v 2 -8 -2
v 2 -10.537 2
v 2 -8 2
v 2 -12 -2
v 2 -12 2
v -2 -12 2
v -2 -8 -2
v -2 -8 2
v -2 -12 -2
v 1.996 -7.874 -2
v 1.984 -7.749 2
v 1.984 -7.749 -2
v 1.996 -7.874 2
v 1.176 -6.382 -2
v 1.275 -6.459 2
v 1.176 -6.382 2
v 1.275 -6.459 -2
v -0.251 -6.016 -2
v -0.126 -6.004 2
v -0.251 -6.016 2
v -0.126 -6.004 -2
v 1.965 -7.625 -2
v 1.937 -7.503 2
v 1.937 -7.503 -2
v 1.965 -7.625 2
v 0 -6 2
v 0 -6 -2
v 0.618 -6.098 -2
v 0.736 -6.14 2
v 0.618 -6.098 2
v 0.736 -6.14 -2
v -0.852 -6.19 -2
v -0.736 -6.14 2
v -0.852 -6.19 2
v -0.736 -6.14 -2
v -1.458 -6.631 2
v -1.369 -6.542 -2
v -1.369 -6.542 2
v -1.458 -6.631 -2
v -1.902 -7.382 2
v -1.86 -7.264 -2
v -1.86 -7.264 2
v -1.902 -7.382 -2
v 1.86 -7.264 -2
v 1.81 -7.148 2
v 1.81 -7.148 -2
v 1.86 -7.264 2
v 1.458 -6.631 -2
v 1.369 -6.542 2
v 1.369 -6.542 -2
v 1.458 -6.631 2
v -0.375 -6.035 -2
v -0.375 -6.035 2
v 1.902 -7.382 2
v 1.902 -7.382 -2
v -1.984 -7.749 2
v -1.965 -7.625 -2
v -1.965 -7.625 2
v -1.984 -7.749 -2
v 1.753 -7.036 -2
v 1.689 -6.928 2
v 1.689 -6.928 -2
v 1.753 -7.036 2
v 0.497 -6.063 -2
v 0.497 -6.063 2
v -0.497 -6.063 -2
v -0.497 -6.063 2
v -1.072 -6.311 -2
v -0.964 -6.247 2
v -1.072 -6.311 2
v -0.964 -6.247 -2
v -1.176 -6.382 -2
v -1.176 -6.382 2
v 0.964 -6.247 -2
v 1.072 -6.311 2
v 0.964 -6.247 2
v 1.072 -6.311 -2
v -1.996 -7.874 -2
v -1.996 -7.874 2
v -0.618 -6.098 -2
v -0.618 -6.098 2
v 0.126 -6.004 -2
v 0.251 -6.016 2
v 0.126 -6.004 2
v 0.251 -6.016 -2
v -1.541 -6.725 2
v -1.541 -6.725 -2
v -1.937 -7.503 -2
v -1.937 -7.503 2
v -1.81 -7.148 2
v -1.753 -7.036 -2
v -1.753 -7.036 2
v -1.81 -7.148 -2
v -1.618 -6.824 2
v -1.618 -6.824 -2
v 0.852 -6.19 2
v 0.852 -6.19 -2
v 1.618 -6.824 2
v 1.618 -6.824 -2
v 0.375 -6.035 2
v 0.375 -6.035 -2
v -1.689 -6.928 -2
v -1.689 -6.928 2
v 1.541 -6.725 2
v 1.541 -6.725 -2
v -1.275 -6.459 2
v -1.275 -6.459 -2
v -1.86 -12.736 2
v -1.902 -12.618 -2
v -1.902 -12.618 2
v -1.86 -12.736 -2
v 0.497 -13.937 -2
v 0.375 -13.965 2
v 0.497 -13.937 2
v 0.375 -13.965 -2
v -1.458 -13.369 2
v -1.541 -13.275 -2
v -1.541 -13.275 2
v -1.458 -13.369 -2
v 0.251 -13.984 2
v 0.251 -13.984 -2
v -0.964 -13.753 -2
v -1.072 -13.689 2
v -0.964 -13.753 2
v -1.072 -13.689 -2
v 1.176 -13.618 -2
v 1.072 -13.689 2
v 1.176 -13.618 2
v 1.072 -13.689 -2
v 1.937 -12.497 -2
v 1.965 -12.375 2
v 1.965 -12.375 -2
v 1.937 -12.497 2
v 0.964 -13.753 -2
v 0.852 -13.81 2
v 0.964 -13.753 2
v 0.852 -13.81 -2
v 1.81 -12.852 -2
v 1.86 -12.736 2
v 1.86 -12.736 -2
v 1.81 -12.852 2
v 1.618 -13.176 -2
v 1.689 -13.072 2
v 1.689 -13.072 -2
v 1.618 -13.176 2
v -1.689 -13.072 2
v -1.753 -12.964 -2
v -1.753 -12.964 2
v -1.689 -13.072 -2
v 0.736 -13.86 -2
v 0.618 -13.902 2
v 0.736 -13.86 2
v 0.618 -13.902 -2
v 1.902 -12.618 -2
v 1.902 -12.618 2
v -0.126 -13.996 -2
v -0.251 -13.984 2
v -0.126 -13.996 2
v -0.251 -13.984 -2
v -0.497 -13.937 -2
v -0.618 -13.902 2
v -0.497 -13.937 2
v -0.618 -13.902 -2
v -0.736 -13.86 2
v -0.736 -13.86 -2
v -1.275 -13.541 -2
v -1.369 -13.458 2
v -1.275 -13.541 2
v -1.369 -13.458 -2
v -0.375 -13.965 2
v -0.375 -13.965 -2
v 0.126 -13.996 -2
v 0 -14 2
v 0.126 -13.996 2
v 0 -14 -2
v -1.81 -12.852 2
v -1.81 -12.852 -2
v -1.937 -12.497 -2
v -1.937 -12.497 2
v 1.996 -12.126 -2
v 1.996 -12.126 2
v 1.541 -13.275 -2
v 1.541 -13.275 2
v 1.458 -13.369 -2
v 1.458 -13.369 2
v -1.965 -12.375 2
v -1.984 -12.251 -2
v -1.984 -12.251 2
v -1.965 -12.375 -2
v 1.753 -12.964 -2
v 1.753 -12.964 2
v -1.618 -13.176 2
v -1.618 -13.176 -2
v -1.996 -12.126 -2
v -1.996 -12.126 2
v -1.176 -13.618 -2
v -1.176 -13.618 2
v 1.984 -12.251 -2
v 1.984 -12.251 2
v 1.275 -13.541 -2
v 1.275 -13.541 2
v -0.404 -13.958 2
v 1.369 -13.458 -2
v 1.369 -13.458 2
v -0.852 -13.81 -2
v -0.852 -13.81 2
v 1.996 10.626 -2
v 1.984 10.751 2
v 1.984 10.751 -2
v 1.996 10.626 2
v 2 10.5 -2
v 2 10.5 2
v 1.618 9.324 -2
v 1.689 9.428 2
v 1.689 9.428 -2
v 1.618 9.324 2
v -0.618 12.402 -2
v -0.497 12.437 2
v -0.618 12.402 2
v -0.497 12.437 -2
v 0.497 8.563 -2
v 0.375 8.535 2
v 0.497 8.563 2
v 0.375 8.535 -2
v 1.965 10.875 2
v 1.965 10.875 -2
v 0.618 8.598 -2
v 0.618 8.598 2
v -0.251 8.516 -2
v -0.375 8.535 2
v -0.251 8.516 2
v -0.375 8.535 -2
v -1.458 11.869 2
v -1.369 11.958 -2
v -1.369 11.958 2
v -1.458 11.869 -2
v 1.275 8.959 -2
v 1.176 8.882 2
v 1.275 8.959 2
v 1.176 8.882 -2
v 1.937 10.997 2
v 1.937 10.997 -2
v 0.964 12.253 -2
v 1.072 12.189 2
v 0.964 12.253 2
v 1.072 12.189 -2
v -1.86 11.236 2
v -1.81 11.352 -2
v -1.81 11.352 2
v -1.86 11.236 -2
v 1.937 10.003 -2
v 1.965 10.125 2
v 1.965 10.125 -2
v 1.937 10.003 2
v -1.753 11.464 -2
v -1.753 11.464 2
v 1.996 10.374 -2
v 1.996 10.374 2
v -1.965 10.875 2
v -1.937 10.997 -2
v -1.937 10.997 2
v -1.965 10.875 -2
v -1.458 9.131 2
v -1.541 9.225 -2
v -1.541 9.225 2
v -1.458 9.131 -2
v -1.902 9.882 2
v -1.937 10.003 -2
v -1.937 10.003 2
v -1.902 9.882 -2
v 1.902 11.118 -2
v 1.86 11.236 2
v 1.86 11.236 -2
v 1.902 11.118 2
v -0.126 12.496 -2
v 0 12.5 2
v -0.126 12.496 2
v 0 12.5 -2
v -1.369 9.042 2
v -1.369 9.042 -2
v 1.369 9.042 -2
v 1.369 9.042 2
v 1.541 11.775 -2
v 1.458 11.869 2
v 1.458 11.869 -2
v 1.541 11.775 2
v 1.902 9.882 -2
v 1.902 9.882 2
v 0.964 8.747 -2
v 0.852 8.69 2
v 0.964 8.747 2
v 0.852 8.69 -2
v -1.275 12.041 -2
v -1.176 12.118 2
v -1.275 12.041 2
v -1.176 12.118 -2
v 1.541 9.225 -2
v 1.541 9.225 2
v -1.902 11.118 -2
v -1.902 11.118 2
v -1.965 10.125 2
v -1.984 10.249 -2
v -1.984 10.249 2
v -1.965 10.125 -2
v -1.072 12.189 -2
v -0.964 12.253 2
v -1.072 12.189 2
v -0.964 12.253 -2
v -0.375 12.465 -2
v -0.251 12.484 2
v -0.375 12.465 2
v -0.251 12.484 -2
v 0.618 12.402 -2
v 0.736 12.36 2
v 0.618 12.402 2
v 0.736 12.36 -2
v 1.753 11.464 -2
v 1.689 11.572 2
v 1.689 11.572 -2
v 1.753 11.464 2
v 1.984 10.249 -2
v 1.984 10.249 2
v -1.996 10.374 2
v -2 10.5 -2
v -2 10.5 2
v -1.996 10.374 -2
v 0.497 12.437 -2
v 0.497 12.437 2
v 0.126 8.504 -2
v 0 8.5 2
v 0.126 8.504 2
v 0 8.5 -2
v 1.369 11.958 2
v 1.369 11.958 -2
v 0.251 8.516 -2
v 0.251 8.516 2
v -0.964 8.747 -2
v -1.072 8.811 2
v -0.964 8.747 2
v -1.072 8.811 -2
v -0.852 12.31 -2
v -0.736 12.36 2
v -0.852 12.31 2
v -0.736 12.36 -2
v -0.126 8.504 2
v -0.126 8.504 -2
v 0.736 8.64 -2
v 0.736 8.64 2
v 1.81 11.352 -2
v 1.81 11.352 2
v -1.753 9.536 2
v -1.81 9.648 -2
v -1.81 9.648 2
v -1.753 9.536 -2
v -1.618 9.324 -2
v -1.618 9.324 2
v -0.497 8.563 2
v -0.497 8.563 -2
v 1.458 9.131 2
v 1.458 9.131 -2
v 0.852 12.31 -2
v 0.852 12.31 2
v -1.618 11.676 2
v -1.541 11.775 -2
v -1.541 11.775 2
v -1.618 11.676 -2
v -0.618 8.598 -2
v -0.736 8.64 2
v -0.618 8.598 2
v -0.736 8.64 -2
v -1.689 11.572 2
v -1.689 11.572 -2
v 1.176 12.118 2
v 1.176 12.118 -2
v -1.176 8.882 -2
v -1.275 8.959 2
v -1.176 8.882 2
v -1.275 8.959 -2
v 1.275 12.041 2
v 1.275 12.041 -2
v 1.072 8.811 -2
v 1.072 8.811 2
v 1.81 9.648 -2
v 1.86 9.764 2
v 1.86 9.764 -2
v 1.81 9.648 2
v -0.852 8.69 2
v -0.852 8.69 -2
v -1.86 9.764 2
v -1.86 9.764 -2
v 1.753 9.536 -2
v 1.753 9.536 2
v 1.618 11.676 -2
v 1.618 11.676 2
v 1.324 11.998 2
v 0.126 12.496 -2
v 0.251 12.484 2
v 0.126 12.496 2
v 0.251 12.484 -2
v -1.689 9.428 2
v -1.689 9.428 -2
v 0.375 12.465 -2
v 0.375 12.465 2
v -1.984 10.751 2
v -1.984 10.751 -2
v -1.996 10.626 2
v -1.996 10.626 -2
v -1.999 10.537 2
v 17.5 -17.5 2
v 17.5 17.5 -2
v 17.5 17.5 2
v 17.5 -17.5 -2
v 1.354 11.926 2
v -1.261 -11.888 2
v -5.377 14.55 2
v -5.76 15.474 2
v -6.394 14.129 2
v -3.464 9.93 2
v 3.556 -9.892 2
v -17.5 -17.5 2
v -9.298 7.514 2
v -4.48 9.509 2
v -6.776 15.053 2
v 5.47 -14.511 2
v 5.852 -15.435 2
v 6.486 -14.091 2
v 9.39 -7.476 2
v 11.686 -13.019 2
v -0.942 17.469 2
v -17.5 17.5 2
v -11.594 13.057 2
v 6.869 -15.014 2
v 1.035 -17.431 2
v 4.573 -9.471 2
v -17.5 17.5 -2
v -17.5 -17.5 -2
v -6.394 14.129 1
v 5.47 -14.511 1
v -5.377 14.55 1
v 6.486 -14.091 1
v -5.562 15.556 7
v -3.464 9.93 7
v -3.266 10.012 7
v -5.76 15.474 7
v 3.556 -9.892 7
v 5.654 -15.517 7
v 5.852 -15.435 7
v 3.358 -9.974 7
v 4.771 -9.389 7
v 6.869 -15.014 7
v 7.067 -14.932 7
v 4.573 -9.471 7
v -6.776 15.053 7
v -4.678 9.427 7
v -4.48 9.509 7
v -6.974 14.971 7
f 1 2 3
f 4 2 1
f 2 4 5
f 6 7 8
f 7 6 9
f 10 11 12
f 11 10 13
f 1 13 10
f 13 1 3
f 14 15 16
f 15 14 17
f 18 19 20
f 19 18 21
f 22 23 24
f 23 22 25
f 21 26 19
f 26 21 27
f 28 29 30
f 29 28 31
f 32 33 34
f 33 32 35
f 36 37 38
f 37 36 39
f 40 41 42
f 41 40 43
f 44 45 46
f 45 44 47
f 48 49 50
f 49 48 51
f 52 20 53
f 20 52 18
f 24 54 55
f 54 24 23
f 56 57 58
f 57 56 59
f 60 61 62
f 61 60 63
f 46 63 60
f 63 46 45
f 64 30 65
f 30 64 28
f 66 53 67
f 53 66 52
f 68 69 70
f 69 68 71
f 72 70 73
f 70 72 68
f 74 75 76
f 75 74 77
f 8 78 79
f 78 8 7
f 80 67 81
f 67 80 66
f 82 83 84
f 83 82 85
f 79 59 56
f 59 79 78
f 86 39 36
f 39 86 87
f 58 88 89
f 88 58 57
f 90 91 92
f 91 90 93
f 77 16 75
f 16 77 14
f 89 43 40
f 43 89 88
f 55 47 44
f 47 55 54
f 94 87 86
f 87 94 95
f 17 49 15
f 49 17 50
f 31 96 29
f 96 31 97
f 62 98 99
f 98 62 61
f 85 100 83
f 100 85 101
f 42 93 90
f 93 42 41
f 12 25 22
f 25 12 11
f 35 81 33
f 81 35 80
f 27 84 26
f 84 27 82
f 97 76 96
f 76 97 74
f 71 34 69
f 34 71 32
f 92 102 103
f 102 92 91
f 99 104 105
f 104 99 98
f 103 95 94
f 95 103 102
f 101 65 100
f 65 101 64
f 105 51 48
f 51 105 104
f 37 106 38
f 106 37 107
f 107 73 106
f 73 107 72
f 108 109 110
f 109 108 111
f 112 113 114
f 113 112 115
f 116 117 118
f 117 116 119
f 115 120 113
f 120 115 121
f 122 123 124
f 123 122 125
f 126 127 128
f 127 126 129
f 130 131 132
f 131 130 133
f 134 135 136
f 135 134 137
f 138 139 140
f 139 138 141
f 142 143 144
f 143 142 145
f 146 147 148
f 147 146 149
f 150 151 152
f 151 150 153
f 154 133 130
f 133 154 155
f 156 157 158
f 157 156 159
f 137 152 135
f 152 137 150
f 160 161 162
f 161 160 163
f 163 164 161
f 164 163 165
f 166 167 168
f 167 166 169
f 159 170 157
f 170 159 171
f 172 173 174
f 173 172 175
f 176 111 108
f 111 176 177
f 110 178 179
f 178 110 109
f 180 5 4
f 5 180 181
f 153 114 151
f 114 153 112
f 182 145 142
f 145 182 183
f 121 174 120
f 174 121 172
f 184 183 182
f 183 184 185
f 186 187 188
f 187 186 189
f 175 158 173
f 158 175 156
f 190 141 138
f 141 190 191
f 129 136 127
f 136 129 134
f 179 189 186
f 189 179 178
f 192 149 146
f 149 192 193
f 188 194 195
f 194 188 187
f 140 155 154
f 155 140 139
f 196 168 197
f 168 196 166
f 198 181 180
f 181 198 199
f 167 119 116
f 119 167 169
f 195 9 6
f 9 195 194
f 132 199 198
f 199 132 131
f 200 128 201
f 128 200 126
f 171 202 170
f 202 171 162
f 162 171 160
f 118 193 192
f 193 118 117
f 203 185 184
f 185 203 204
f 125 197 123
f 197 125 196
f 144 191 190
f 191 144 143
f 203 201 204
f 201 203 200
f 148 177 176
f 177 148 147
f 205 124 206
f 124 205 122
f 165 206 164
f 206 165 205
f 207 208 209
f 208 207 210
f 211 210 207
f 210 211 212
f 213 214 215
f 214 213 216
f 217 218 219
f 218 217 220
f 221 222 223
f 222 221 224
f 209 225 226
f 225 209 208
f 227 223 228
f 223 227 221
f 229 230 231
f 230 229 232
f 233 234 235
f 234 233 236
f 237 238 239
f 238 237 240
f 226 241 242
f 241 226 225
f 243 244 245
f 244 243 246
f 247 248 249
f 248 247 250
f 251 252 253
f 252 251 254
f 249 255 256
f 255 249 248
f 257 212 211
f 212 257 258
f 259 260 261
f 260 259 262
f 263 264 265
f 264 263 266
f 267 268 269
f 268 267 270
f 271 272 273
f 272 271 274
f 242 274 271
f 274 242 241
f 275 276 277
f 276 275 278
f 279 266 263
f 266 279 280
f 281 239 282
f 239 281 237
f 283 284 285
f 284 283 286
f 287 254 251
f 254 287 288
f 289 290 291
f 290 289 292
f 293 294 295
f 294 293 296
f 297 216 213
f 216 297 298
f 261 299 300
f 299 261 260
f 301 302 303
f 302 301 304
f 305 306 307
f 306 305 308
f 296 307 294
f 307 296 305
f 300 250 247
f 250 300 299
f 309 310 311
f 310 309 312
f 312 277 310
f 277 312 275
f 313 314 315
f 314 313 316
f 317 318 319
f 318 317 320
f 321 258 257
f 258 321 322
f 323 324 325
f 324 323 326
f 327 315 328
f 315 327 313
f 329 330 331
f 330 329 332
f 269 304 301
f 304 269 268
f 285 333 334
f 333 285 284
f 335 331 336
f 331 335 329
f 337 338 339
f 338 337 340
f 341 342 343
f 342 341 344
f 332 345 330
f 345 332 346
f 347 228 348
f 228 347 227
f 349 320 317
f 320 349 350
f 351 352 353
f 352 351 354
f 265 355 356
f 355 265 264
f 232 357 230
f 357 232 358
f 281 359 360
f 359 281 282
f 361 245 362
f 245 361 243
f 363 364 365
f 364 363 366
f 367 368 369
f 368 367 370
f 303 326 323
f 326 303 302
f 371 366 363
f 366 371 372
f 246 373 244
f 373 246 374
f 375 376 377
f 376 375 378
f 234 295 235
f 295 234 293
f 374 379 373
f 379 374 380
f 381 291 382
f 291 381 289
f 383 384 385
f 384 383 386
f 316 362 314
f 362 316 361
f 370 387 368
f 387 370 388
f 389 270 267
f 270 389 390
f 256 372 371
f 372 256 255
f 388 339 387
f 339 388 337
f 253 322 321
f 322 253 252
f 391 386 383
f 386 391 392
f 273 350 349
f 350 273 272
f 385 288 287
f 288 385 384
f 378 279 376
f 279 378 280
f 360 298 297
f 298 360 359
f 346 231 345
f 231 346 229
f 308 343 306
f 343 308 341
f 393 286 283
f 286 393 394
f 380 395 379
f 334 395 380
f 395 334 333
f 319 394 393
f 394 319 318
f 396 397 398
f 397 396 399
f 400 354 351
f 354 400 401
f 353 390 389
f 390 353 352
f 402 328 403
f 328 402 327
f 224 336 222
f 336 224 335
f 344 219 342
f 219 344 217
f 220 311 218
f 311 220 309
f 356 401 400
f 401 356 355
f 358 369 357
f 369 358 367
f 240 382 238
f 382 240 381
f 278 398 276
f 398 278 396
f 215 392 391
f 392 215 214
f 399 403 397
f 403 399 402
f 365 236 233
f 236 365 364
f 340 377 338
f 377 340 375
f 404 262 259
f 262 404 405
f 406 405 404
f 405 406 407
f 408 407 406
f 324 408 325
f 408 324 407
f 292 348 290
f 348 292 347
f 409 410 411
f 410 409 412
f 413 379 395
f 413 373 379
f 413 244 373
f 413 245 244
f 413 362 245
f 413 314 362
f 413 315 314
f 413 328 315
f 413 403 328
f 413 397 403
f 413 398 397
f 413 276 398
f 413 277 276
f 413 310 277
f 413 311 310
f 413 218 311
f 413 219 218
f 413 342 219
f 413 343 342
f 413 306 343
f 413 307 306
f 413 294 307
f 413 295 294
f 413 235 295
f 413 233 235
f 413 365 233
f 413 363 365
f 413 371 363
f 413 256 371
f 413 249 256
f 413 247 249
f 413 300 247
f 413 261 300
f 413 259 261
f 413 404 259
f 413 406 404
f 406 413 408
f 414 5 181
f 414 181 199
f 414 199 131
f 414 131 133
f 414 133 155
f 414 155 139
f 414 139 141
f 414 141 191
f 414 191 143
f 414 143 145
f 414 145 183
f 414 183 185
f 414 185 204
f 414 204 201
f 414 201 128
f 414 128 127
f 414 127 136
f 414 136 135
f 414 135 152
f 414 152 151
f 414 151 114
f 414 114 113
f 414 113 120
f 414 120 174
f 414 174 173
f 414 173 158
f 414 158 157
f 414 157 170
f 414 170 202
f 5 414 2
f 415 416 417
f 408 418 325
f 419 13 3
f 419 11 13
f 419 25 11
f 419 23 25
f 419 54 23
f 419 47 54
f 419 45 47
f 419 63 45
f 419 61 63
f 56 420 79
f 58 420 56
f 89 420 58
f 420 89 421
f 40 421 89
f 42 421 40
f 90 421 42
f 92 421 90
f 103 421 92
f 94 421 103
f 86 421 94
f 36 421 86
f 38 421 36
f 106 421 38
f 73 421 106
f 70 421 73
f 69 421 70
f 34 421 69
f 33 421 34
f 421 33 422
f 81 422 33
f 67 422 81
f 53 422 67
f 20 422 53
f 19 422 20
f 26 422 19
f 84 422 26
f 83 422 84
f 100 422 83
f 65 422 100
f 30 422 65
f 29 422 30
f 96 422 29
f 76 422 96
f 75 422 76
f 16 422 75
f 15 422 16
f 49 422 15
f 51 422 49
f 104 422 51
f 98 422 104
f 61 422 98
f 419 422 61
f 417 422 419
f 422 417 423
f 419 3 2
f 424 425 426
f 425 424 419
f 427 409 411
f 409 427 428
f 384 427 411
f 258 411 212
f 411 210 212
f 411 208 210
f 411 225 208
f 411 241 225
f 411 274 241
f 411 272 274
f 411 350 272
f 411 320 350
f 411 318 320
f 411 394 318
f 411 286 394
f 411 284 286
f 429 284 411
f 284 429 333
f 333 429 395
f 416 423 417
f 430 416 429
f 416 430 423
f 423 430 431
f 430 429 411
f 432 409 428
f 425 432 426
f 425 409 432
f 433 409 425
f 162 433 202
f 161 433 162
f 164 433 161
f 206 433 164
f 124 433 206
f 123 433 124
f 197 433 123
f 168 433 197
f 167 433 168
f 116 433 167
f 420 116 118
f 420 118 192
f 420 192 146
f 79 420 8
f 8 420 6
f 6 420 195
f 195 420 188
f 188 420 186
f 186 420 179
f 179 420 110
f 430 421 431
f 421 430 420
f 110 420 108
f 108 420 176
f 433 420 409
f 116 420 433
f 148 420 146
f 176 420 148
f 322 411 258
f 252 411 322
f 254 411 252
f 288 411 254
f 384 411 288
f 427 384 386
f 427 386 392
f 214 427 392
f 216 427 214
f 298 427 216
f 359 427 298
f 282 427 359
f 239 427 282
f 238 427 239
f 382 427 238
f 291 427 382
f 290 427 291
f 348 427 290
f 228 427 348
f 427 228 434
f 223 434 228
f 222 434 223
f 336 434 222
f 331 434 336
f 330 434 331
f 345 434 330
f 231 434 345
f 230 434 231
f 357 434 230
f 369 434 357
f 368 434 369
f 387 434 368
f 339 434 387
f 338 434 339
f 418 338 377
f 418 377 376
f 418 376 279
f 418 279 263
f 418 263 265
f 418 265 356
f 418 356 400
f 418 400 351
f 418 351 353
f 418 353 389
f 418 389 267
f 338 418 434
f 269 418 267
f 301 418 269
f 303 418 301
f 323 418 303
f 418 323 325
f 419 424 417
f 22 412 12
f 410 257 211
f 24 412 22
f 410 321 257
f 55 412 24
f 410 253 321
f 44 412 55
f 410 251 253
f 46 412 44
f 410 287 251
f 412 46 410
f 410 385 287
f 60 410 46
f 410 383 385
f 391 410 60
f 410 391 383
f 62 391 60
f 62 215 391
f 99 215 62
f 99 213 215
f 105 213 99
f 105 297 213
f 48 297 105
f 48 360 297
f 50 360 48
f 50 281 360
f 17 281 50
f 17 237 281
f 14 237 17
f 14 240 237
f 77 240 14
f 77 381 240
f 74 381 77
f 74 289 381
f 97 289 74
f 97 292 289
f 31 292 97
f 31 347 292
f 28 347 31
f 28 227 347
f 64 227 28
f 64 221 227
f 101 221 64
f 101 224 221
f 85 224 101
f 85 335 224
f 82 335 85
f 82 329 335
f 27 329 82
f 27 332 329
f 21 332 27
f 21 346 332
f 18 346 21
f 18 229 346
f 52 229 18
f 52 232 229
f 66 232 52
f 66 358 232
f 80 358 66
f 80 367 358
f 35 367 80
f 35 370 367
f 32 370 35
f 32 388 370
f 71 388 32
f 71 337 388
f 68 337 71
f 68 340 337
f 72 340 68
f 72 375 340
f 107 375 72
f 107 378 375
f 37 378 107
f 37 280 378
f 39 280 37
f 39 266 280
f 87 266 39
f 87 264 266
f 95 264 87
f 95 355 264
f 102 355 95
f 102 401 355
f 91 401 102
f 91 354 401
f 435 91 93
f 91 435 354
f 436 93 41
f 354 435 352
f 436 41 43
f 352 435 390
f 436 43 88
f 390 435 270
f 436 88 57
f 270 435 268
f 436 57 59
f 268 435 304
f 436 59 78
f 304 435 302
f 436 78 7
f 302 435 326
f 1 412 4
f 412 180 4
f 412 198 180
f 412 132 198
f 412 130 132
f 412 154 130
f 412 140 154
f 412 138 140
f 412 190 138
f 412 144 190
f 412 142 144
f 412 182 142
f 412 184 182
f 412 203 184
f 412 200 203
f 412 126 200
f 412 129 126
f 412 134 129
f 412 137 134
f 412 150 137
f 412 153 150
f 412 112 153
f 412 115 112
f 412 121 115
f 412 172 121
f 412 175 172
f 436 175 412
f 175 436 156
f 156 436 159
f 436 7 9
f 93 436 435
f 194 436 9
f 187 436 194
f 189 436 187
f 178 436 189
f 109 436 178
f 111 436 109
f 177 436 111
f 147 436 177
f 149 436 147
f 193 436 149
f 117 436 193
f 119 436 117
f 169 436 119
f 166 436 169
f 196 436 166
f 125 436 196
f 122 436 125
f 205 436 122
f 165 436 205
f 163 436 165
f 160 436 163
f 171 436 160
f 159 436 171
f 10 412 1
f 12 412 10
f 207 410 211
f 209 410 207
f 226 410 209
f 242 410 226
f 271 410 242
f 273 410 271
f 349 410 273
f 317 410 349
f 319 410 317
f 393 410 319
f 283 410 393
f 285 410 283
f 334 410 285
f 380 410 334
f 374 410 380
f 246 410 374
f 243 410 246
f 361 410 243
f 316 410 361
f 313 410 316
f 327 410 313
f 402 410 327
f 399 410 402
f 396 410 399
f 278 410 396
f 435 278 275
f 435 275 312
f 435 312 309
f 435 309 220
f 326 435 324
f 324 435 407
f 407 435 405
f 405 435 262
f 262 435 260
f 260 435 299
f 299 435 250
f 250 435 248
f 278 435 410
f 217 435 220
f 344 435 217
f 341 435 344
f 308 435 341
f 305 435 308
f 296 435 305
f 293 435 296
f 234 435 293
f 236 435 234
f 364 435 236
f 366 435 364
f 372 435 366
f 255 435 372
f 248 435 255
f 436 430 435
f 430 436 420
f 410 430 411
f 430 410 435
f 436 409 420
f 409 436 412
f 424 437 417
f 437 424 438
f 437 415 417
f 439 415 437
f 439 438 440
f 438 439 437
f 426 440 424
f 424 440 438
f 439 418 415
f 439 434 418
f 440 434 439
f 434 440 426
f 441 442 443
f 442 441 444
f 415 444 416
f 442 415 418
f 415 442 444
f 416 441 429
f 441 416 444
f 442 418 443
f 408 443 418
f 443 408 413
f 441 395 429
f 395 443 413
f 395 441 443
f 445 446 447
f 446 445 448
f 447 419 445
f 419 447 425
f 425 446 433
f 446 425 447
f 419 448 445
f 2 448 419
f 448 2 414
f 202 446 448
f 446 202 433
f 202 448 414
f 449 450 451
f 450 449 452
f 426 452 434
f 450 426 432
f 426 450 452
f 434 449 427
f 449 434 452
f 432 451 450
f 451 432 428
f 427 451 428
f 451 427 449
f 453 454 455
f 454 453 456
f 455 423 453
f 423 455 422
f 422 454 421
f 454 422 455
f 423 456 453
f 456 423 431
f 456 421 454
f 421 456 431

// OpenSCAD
union()
{

difference()
{
difference()
{
cube([35,35,4], center = true); //base del portamuestras

union()// unión de las piezas que forman los agujeros
{
translate([0,10.5,-5])
cylinder(r=2, h=10, $fn=100); //agujero pequeño

translate([0,-1.5,0]) //añadido en V2
union()//agujero grande
   {
translate([0,-8.5,-0])
cube([4,4,10], center = true); 
translate([0,-6.5,-5])
cylinder(r=2, h=10, $fn=100);
translate([0,-10.5,-5])
cylinder(r=2, h=10, $fn=100);
   }
   }
}
rotate([0,0,45/2])
translate([-0.5,-15.5,1])
cube([1.1,31,30], center = false); //ranura para el dispositivo
}

rotate([0,0,45/2])
union()
{
translate([3.35,13.5,0])//4 piezas que sujetan los substratos
difference()
{
translate([0,0,4.5])
cube([5.5,6,5], center = true);

translate([1,0,7])
rotate([0,45,0])
cube([10,10,5], center = true);
}
rotate([0,0,180])
translate([3.25,13.5,0])
difference()
{
translate([0,0,4.5])
cube([5.5,6,5], center = true);

translate([1,0,7])
rotate([0,45,0])
cube([10,10,5], center = true);
}
rotate([0,0,180])
translate([3.15,13.5,0])
rotate([0,0,180])
translate([6.5,0,0])
difference()
{
translate([0,0,4.5])
cube([5.5,6,5], center = true);

translate([1,0,7])
rotate([0,45,0])
cube([10,10,5], center = true);
}
translate([3.25,13.5,0])
rotate([0,0,180])
translate([6.5,0,0])
difference()
{
translate([0,0,4.5])
cube([5.5,6,5], center = true);

translate([1,0,7])
rotate([0,45,0])
cube([10,10,5], center = true);
}
}
}
